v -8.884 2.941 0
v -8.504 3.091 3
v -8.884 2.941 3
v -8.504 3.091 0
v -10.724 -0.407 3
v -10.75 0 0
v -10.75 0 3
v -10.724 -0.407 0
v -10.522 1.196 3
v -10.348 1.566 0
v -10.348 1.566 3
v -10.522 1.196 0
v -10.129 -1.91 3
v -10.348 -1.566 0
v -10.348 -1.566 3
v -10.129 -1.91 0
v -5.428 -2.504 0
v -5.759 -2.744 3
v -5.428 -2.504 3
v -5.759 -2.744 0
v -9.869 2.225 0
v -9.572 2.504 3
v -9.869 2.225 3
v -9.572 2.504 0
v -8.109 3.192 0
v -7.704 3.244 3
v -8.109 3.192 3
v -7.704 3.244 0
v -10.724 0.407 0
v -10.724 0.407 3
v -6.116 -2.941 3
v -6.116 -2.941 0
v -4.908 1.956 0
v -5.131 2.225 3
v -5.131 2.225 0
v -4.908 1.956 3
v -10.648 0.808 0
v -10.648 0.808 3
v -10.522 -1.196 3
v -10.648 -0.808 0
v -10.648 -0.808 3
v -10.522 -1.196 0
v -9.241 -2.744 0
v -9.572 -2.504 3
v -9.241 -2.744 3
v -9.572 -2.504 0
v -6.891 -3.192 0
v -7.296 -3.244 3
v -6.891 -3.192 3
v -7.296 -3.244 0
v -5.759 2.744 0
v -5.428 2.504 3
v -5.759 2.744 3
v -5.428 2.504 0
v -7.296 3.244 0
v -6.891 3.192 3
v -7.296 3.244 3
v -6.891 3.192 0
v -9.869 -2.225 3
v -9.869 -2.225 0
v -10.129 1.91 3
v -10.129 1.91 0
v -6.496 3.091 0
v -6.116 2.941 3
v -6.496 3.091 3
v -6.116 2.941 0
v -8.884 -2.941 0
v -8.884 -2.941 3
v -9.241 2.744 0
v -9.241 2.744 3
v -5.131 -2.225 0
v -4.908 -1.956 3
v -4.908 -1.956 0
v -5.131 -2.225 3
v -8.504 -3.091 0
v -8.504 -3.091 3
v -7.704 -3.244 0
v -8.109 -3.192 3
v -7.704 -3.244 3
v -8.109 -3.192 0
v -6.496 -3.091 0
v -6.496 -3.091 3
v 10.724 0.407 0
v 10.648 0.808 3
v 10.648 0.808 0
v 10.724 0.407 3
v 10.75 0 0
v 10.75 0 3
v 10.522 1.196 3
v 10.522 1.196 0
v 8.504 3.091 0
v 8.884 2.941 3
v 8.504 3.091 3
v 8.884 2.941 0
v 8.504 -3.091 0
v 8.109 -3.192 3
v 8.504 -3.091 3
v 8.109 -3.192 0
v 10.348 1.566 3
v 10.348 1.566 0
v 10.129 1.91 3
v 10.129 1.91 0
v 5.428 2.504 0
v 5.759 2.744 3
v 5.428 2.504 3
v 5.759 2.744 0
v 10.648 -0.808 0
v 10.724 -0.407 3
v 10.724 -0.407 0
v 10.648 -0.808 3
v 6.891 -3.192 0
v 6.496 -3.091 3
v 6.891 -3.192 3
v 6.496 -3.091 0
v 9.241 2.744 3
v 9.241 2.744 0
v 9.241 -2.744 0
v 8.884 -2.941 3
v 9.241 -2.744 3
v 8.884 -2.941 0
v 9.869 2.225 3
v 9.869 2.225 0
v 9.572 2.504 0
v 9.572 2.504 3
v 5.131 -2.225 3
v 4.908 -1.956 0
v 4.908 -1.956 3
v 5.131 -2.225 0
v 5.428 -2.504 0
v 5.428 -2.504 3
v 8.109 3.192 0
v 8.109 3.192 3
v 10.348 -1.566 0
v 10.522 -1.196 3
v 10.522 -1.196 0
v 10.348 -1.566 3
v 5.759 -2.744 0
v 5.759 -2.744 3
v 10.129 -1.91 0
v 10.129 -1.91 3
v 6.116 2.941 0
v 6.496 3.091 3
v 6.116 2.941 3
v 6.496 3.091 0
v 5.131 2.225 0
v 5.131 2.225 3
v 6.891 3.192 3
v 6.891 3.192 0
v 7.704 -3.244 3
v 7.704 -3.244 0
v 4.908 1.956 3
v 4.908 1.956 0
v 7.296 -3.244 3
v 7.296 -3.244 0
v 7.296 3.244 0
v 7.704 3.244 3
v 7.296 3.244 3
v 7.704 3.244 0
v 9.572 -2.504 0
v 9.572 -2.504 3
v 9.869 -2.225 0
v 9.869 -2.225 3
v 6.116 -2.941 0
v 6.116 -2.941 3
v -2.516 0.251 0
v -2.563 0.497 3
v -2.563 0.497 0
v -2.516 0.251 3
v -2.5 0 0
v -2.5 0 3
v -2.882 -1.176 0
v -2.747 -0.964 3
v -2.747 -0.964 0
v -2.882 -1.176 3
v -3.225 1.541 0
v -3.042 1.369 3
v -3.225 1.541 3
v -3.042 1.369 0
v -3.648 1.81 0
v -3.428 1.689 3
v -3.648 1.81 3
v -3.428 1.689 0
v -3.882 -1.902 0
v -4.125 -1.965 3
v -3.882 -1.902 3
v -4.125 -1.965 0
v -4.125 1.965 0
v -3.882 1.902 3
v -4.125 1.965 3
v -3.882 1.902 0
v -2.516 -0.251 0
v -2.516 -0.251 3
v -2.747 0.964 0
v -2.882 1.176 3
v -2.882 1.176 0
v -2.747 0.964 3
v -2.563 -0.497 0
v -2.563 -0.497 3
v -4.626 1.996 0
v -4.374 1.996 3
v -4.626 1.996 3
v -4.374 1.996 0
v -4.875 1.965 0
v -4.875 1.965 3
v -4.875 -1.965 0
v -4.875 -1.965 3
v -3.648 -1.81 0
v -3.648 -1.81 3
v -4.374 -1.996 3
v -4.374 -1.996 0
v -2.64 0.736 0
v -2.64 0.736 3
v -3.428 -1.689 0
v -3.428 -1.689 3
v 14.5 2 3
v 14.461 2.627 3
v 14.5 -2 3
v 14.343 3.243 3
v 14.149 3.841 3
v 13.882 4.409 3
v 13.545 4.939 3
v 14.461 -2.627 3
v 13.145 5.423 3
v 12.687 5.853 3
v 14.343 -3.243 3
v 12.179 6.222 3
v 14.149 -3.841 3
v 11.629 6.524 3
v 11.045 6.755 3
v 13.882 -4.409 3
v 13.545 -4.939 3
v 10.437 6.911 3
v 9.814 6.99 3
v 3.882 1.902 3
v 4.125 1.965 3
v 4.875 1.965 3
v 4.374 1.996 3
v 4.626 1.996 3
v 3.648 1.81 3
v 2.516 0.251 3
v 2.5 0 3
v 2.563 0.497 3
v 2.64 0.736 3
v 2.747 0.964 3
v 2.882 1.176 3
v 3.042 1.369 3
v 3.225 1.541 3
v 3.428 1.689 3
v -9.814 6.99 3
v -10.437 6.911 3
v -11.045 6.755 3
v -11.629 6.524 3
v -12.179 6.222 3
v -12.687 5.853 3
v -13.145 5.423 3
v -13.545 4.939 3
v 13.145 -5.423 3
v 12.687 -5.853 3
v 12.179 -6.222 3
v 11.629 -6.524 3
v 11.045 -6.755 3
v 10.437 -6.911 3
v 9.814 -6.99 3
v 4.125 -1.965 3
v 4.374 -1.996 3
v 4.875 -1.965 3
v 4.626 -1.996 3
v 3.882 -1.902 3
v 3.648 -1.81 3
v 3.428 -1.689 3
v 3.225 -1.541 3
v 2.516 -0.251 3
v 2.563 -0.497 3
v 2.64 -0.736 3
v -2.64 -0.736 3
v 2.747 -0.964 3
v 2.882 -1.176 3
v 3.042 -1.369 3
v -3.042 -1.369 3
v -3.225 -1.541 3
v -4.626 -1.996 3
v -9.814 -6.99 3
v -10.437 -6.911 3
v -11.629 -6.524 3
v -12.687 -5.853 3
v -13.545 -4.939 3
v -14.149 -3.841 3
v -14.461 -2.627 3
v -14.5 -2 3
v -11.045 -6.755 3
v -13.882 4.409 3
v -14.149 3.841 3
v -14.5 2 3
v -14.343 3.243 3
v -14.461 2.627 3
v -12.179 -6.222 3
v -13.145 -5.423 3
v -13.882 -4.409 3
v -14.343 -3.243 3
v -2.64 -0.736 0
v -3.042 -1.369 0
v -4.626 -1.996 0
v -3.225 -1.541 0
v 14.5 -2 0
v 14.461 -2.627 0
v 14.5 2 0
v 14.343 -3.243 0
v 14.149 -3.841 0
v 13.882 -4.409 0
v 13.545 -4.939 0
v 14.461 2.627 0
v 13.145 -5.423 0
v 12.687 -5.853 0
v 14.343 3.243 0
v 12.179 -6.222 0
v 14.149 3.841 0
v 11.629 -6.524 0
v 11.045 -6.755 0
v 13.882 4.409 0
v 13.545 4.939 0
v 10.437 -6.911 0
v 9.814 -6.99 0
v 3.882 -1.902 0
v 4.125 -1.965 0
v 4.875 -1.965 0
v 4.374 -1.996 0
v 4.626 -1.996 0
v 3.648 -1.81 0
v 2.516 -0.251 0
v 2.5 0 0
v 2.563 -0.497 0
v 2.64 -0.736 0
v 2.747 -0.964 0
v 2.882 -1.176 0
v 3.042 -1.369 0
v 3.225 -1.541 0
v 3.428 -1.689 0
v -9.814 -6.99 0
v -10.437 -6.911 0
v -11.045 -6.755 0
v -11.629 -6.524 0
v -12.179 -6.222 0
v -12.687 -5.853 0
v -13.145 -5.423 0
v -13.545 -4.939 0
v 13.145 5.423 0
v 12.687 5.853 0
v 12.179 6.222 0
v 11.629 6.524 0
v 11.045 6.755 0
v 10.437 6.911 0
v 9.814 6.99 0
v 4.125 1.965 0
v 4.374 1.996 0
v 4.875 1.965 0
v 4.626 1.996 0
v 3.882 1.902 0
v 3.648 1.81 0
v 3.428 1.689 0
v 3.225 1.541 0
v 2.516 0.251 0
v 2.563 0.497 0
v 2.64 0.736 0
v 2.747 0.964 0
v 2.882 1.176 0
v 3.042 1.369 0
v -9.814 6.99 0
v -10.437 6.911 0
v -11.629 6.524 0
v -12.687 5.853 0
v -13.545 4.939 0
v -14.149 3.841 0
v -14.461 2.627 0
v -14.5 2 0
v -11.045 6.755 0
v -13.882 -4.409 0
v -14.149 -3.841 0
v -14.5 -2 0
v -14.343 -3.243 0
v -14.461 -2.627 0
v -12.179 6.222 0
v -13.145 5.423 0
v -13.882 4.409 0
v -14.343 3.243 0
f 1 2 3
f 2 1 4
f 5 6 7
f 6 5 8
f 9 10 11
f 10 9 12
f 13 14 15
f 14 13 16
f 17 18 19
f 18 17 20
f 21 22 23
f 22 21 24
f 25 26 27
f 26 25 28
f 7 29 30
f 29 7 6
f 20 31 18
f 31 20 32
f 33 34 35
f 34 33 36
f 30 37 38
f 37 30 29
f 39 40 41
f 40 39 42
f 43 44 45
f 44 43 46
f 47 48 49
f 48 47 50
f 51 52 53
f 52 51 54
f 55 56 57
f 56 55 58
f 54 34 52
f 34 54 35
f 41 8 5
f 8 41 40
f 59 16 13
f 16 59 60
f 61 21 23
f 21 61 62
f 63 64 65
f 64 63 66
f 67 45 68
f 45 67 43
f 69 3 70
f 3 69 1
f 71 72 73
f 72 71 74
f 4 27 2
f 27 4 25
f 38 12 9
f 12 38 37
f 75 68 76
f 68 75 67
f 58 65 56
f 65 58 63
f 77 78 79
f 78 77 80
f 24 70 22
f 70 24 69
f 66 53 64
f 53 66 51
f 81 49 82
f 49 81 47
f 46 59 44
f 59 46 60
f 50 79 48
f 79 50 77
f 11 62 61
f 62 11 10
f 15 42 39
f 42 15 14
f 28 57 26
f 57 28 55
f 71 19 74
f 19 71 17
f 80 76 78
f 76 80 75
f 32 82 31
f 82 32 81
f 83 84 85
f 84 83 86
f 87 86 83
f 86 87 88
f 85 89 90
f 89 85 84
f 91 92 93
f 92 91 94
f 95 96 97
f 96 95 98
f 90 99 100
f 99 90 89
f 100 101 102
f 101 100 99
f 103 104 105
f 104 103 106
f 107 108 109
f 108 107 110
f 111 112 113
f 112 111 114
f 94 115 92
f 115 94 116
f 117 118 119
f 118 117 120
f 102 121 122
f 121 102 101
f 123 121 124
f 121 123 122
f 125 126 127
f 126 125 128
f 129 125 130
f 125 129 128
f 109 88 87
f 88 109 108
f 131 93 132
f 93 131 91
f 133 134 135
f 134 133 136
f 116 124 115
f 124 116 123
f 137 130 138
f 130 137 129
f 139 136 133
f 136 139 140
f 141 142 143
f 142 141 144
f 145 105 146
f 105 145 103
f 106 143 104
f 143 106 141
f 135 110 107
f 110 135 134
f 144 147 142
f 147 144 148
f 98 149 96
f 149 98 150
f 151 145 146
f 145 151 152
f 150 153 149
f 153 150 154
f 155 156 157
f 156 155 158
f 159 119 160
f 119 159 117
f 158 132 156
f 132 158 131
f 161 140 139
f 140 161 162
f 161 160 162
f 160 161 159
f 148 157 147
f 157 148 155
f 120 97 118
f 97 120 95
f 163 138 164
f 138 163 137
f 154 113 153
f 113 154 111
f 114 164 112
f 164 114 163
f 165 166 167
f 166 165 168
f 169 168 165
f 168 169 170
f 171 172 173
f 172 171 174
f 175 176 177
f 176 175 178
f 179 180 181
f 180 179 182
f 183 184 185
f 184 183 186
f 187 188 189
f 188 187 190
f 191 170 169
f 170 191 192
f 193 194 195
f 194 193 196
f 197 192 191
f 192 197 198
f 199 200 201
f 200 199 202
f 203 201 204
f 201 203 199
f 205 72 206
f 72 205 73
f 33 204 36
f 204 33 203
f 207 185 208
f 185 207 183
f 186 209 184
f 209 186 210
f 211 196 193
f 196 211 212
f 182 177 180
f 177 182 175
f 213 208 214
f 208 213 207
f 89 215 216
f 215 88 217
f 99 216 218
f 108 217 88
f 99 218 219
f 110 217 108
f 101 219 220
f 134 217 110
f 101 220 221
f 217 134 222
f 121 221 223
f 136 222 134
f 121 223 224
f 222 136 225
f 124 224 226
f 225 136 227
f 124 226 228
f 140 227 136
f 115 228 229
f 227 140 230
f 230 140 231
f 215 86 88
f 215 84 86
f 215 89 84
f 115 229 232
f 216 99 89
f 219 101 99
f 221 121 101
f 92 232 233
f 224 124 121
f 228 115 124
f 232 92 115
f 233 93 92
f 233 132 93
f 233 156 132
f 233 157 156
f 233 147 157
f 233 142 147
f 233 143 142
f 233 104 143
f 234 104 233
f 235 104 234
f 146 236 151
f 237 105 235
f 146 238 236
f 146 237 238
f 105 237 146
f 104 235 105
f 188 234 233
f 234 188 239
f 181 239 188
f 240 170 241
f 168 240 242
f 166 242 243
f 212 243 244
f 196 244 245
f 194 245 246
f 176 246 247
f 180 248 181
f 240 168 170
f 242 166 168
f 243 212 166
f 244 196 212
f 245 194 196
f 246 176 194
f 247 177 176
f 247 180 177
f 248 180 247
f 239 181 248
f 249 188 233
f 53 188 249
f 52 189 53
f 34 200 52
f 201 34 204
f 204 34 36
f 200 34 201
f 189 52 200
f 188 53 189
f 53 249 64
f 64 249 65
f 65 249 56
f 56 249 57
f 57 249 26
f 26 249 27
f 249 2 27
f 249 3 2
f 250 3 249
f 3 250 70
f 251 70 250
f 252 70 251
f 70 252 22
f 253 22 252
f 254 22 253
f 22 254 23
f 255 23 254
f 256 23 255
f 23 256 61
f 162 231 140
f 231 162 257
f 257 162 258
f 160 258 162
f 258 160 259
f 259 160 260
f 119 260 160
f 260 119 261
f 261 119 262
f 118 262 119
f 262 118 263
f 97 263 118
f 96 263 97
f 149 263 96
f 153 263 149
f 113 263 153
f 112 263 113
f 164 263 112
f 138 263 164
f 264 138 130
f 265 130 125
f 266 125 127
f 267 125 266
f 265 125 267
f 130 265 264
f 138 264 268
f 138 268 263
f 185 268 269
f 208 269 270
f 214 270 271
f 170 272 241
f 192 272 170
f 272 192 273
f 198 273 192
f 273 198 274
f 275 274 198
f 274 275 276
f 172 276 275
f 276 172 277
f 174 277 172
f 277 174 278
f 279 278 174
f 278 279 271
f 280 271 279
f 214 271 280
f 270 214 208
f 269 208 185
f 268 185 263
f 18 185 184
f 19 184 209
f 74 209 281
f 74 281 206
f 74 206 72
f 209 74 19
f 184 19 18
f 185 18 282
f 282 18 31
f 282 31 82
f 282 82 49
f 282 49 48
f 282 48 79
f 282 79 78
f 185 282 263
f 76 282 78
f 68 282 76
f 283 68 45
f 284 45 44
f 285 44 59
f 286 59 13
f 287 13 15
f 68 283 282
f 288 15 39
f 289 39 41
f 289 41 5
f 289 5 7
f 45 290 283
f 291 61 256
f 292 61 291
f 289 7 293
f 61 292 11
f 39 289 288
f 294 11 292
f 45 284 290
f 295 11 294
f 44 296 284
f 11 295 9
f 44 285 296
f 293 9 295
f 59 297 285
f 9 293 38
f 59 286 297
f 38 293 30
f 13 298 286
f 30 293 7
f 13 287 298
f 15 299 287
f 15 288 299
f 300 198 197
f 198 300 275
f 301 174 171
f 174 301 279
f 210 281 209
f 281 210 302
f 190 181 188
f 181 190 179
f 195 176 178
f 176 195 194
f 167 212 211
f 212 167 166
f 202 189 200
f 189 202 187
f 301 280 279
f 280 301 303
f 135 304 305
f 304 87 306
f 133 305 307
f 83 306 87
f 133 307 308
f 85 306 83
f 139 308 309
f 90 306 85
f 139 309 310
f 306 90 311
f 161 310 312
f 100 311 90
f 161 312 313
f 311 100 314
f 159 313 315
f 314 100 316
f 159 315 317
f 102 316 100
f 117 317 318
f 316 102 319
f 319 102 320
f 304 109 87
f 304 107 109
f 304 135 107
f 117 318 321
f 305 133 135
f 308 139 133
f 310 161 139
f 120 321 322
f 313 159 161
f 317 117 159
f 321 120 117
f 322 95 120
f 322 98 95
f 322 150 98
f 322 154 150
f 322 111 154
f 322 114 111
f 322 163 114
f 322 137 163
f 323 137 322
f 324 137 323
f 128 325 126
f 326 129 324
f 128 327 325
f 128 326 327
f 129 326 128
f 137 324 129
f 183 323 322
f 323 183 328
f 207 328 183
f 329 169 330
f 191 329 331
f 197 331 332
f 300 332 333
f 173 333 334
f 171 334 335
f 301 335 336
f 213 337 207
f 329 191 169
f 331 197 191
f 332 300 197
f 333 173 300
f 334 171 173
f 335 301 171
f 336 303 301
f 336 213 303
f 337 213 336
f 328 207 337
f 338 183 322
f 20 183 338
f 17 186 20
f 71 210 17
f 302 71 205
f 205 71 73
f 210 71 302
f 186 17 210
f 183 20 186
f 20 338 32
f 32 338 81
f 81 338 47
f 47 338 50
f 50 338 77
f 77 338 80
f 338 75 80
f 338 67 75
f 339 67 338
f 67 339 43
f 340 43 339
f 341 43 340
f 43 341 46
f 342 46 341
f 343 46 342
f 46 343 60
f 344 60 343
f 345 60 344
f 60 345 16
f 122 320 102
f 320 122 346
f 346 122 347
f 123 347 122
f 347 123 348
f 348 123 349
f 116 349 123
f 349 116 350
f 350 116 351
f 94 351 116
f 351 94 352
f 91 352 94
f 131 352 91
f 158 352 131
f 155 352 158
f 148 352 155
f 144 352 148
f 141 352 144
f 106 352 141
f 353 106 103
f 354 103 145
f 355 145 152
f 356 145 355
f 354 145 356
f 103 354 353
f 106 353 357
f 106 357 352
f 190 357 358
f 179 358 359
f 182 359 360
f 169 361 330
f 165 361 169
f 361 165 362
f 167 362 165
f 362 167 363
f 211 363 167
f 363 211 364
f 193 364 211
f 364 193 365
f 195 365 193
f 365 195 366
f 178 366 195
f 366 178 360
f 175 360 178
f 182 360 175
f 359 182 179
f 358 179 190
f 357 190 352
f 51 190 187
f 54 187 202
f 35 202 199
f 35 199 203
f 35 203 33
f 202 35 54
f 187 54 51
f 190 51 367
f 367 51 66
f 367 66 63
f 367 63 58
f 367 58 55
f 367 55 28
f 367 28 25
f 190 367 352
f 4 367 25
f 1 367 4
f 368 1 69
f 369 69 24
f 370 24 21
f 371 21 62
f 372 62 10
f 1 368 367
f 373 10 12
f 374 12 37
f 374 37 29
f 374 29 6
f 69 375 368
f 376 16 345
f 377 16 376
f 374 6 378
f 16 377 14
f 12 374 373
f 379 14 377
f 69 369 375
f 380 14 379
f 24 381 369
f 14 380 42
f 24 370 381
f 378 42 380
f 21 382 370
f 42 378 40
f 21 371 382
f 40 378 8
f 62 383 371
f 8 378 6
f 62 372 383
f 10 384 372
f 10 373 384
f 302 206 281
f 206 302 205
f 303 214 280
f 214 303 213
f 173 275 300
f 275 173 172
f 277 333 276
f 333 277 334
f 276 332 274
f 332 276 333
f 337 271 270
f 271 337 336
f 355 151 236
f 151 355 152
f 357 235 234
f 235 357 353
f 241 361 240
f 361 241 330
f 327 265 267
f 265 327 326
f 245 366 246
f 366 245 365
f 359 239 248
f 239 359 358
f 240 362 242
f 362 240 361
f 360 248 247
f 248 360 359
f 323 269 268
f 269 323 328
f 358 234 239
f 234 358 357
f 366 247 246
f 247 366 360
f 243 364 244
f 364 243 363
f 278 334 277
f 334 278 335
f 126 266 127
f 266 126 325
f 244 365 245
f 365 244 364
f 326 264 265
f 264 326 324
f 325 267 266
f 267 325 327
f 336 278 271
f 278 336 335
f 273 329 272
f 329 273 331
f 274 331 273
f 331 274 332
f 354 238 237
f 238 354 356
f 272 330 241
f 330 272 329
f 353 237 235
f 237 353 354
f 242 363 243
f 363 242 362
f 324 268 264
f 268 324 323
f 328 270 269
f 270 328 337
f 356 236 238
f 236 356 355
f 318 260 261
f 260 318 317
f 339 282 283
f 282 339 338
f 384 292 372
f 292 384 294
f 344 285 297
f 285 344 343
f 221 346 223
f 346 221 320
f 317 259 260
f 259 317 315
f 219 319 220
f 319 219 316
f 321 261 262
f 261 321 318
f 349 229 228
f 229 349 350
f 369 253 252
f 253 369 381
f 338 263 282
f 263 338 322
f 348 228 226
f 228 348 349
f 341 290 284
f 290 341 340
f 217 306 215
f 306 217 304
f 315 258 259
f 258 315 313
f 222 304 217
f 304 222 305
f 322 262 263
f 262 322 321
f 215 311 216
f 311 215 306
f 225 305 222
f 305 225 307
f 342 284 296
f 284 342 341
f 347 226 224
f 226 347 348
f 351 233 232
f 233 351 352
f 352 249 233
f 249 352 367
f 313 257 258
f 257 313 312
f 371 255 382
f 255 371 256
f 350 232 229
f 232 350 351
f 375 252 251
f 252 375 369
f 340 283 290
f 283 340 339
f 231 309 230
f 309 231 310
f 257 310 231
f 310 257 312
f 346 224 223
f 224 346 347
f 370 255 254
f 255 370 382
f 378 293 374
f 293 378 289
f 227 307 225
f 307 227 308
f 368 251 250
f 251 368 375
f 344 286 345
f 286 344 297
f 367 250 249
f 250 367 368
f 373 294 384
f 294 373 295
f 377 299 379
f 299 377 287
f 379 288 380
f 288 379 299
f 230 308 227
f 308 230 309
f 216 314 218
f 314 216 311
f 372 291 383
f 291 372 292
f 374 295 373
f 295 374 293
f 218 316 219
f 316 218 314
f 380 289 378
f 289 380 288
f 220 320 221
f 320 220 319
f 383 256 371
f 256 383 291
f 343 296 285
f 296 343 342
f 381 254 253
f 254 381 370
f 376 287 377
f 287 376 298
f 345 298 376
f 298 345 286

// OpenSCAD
$fn = 50;


difference() {
	union() {
		hull() {
			translate(v = [-9.5000000000, 2.0000000000, 0]) {
				cylinder(h = 3, r = 5);
			}
			translate(v = [9.5000000000, 2.0000000000, 0]) {
				cylinder(h = 3, r = 5);
			}
			translate(v = [-9.5000000000, -2.0000000000, 0]) {
				cylinder(h = 3, r = 5);
			}
			translate(v = [9.5000000000, -2.0000000000, 0]) {
				cylinder(h = 3, r = 5);
			}
		}
	}
	union() {
		#translate(v = [-7.5000000000, 0.0000000000, -100.0000000000]) {
			cylinder(h = 200, r = 3.2500000000);
		}
		#translate(v = [-7.5000000000, 0.0000000000, -100.0000000000]) {
			cylinder(h = 200, r = 3.2500000000);
		}
		#translate(v = [7.5000000000, 0.0000000000, -100.0000000000]) {
			cylinder(h = 200, r = 3.2500000000);
		}
		#translate(v = [7.5000000000, 0.0000000000, -100.0000000000]) {
			cylinder(h = 200, r = 3.2500000000);
		}
		#translate(v = [-4.5000000000, 0, 0]) {
			cylinder(h = 3, r = 2.0000000000);
		}
		#translate(v = [4.5000000000, 0, 0]) {
			cylinder(h = 3, r = 2.0000000000);
		}
	}
}
